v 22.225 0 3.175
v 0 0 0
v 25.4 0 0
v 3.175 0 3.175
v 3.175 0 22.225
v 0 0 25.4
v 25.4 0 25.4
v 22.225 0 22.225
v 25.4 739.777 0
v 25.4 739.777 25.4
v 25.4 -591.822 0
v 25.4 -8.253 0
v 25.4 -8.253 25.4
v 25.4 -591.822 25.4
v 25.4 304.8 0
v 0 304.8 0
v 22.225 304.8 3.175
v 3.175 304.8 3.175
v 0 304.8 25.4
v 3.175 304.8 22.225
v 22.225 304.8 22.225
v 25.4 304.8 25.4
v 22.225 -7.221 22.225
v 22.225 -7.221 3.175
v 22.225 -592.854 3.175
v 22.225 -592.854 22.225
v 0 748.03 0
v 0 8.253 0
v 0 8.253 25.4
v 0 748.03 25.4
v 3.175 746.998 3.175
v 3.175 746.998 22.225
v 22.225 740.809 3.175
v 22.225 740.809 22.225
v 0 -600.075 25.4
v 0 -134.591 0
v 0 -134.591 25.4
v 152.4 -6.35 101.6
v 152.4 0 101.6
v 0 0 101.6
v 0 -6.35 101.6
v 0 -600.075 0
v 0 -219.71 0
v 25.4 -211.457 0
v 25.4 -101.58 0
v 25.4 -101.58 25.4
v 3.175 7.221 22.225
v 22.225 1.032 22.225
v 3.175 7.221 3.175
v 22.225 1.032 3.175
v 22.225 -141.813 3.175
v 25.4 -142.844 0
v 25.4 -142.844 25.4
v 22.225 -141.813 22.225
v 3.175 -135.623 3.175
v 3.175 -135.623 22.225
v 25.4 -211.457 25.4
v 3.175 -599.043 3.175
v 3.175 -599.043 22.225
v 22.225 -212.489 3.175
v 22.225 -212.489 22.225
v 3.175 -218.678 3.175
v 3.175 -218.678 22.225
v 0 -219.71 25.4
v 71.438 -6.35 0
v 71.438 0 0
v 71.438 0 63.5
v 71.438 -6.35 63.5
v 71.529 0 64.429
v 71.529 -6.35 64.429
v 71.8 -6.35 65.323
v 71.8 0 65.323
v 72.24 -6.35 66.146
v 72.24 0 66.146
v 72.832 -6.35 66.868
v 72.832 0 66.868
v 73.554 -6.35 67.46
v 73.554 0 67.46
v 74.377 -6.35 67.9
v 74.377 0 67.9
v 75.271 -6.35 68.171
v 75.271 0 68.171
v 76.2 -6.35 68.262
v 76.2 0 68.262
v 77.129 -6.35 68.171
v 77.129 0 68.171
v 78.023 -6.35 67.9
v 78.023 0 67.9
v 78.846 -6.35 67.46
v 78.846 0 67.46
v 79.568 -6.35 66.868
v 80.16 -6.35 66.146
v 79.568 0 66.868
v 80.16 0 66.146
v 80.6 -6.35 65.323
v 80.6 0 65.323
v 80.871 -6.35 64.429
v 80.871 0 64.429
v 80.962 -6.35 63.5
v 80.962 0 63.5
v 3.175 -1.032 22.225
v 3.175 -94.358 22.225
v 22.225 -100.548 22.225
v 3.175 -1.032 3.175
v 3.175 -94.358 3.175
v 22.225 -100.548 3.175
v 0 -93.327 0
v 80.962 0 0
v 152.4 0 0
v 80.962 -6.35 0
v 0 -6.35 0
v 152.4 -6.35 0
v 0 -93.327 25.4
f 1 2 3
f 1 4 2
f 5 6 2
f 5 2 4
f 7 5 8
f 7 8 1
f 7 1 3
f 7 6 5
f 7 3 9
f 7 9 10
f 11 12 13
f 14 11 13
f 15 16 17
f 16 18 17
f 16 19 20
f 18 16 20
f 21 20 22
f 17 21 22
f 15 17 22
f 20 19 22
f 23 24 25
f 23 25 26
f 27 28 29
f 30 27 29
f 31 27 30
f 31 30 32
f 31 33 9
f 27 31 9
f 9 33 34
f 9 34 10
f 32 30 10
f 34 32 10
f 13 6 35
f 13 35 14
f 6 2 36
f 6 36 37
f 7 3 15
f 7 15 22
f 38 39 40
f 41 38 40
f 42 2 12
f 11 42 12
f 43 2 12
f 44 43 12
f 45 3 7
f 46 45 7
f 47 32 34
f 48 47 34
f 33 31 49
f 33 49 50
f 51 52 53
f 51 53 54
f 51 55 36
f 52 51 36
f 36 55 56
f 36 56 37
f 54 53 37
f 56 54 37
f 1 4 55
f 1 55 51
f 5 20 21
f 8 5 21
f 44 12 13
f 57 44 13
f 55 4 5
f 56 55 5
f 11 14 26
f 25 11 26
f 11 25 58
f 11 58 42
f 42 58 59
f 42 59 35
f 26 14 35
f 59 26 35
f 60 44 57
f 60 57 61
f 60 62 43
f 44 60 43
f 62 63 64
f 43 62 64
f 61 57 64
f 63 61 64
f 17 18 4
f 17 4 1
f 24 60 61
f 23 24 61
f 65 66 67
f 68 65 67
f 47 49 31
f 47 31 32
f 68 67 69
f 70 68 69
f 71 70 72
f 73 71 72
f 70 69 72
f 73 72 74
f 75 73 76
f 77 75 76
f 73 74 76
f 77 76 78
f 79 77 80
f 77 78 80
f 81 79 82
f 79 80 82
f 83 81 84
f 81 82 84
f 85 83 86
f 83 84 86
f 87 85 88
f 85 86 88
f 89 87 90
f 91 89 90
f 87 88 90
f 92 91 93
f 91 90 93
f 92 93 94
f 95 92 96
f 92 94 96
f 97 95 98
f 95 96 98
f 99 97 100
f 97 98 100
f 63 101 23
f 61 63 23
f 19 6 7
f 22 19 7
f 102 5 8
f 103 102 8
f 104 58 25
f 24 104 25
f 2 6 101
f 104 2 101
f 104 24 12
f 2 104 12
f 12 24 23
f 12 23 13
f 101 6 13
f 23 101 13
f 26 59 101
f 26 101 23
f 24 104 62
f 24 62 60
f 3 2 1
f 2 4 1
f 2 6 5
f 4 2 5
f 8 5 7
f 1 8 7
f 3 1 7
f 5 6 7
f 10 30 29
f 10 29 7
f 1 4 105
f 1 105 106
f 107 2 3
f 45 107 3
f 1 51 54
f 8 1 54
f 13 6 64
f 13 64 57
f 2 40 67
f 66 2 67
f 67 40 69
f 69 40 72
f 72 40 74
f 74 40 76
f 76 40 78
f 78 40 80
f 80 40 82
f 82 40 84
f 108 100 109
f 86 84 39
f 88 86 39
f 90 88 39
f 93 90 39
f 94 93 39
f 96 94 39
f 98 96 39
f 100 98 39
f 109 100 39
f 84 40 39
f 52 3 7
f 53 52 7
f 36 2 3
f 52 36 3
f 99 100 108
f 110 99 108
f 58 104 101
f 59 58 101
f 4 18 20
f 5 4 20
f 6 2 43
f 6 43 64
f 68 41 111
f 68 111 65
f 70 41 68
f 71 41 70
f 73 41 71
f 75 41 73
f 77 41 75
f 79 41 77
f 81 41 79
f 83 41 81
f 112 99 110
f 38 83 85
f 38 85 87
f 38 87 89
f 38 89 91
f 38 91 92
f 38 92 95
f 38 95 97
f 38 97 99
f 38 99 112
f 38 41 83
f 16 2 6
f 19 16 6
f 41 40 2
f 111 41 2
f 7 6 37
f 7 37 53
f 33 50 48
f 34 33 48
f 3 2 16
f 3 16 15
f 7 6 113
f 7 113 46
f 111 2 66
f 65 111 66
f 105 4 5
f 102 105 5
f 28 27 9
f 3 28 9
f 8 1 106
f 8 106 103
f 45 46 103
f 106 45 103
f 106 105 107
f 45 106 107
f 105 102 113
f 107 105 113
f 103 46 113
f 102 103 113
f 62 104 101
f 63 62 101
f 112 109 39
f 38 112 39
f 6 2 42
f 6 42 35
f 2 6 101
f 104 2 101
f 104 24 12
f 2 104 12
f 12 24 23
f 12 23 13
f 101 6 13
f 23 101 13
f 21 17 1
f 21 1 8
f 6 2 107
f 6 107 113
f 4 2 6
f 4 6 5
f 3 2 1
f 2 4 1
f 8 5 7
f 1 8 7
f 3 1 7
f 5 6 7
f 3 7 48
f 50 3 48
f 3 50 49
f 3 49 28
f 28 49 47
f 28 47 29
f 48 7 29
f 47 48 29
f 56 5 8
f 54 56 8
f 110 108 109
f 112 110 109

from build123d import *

# Parameters (mm, degrees)
F0_W      = 25.4
F0_H      = 25.4
F0_W_2    = 19.05
F0_H_2    = 19.05
F1_DEPTH  = 748.03
F3_DEPTH  = 25.4
F4_W      = 25.4
F4_H      = 25.4
F4_W_2    = 19.05
F4_H_2    = 19.05
F5_DEPTH  = 219.71
F7_DEPTH  = 25.4
F8_W      = 25.4
F8_H      = 25.4
F8_W_2    = 19.05
F8_H_2    = 19.05
F9_DEPTH  = 304.8
F10_W     = 25.4
F10_H     = 25.4
F10_W_2   = 19.05
F10_H_2   = 19.05
F11_DEPTH = 600.075
F13_DEPTH = 25.4
F14_W     = 25.4
F14_H     = 25.4
F14_W_2   = 19.05
F14_H_2   = 19.05
F15_DEPTH = 101.5796038
F17_DEPTH = 25.401
F18_W     = 25.4
F18_H     = 25.3999981404
F18_W_2   = 19.05
F18_H_2   = 19.0499981404
F19_DEPTH = 142.844393
F21_DEPTH = 25.4009981404
F23_DEPTH = 6.35


with BuildPart() as f1:
    # F0 (on Front) → F1 (new body)
    with BuildSketch(Plane.XZ):
        with Locations((12.7, 12.7)):
            Rectangle(F0_W, F0_H)
        with Locations((12.7, 12.7)):
            Rectangle(F0_W_2, F0_H_2, mode=Mode.SUBTRACT)
    extrude(amount=-F1_DEPTH)

    # F2 (on face) → F3 (cut, through all)
    with BuildSketch(Plane.XY.offset(25.4)):
        Polygon((0, 8.2529602843), (0, 0), (25.4, 0), align=None)
        Polygon((25.4, 739.7770397157), (25.4, 748.03), (0, 748.03), align=None)
    extrude(amount=-F3_DEPTH, mode=Mode.SUBTRACT)


with BuildPart() as f5:
    # F4 (on Front) → F5 (new body)
    with BuildSketch(Plane.XZ):
        with Locations((12.7, 12.7)):
            Rectangle(F4_W, F4_H)
        with Locations((12.7, 12.7)):
            Rectangle(F4_W_2, F4_H_2, mode=Mode.SUBTRACT)
    extrude(amount=F5_DEPTH)

    # F6 (on face) → F7 (cut, through all)
    with BuildSketch(Plane.XY.offset(25.4)):
        Polygon((25.4, -211.4570397157), (0, -219.71), (25.4, -219.71), align=None)
        Polygon((25.4, -8.2529602843), (25.4, 0), (0, 0), align=None)
    extrude(amount=-F7_DEPTH, mode=Mode.SUBTRACT)


with BuildPart() as f9:
    # F8 (on Front) → F9 (new body)
    with BuildSketch(Plane.XZ):
        with Locations((12.7, 12.7)):
            Rectangle(F8_W, F8_H)
        with Locations((12.7, 12.7)):
            Rectangle(F8_W_2, F8_H_2, mode=Mode.SUBTRACT)
    extrude(amount=-F9_DEPTH)


with BuildPart() as f11:
    # F10 (on Front) → F11 (new body)
    with BuildSketch(Plane.XZ):
        with Locations((12.7, 12.7)):
            Rectangle(F10_W, F10_H)
        with Locations((12.7, 12.7)):
            Rectangle(F10_W_2, F10_H_2, mode=Mode.SUBTRACT)
    extrude(amount=F11_DEPTH)

    # F12 (on face) → F13 (cut, through all)
    with BuildSketch(Plane.XY.offset(25.4)):
        Polygon((25.4, 0), (0, 0), (25.4, -8.2529602843), align=None)
        Polygon((25.4, -591.8220397157), (0, -600.075), (25.4, -600.075), align=None)
    extrude(amount=-F13_DEPTH, mode=Mode.SUBTRACT)


with BuildPart() as f15:
    # F14 (on Front) → F15 (new body)
    with BuildSketch(Plane.XZ):
        with Locations((12.7, 12.7)):
            Rectangle(F14_W, F14_H)
        with Locations((12.7, 12.7)):
            Rectangle(F14_W_2, F14_H_2, mode=Mode.SUBTRACT)
    extrude(amount=F15_DEPTH)

    # F16 (on face) → F17 (cut, through all)
    with BuildSketch(Plane.XY.offset(25.4)):
        Polygon((0, -101.5796038), (25.4, -101.5796038), (0, -93.3266435157), align=None)
    extrude(amount=-F17_DEPTH, mode=Mode.SUBTRACT)


with BuildPart() as f19:
    # F18 (on Front) → F19 (new body)
    with BuildSketch(Plane.XZ):
        with Locations((12.7, 12.6999990702)):
            Rectangle(F18_W, F18_H)
        with Locations((12.7, 12.6999990702)):
            Rectangle(F18_W_2, F18_H_2, mode=Mode.SUBTRACT)
    extrude(amount=F19_DEPTH)

    # F20 (on face) → F21 (cut, through all)
    with BuildSketch(Plane.XY.offset(25.3999981404)):
        Polygon((0, -142.844393), (25.4, -142.844393), (0, -134.5914327157), align=None)
    extrude(amount=-F21_DEPTH, mode=Mode.SUBTRACT)


with BuildPart() as f23:
    # F22 (on Front) → F23 (new body)
    with BuildSketch(Plane.XZ):
        with BuildLine():
            Line((0, 101.6), (0, 0))
            Line((0, 0), (71.4375, 0))
            Line((71.4375, 0), (71.4375, 63.5))
            ThreePointArc((71.4375, 63.5), (76.2, 68.2625), (80.9625, 63.5))
            Line((80.9625, 63.5), (80.9625, 0))
            Line((80.9625, 0), (152.4, 0))
            Line((152.4, 0), (152.4, 101.6))
            Line((152.4, 101.6), (0, 101.6))
        make_face()
    extrude(amount=F23_DEPTH)


solid = Compound([f1.part, f5.part, f9.part, f11.part, f15.part, f19.part, f23.part])
